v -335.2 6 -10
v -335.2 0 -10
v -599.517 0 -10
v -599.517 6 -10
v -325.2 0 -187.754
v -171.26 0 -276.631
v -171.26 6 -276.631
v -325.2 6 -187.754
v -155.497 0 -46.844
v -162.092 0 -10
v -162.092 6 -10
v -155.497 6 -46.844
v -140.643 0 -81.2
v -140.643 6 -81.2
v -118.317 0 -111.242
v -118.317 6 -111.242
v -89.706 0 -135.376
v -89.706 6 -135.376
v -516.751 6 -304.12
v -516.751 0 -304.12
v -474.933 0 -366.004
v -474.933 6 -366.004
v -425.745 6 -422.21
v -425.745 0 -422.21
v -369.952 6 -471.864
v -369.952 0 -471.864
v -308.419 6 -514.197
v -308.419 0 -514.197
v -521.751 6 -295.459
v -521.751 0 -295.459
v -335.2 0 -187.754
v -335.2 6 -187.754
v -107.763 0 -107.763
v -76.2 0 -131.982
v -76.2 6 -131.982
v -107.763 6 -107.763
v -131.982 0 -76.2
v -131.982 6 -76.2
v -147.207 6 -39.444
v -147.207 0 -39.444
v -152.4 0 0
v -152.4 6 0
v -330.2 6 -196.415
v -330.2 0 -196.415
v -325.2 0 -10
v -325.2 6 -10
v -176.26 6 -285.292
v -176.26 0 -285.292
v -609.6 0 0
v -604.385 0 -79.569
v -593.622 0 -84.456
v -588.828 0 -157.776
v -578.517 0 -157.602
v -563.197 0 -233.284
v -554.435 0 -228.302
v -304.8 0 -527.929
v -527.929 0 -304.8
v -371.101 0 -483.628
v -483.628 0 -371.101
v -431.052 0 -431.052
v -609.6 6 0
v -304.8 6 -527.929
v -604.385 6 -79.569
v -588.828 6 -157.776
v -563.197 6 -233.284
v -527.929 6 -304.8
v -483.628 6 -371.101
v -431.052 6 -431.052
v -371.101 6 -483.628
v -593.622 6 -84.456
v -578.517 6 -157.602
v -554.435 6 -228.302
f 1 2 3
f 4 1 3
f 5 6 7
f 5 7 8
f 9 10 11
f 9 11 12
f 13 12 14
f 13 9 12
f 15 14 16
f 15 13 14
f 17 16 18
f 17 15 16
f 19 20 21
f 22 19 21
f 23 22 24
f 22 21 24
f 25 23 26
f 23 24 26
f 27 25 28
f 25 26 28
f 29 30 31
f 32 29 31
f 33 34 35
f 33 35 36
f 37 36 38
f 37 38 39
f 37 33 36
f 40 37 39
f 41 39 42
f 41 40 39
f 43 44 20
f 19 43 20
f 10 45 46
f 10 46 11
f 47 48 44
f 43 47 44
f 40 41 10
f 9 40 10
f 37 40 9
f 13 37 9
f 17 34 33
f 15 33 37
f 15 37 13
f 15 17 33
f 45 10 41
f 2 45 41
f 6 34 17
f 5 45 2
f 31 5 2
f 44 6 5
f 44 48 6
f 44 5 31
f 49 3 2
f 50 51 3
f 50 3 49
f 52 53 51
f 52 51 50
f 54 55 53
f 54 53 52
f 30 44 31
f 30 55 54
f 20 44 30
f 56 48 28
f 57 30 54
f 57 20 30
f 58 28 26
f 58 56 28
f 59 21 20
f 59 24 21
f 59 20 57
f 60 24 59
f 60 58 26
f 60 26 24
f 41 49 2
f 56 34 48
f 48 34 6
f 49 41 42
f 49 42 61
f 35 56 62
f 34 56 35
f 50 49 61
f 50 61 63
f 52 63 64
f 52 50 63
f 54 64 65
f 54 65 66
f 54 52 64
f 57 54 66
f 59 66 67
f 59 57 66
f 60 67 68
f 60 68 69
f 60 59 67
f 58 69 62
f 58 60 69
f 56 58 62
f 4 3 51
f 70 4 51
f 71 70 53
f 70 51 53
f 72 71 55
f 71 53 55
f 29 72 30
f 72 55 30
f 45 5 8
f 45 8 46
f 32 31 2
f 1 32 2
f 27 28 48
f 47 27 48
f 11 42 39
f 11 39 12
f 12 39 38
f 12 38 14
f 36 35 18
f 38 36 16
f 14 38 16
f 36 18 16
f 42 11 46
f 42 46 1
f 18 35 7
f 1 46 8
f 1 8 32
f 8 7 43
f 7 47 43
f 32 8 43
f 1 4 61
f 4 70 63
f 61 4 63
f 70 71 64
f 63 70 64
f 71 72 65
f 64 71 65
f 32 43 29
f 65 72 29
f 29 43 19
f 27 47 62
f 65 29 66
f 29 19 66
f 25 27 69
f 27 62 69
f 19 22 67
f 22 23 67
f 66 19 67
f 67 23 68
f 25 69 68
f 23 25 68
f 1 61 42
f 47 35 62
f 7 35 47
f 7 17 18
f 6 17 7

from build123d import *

# Parameters (mm, degrees)
BOSS_EXTRUDE3_DEPTH = 6


with BuildPart() as part:
    # Sketch1 → Boss-Extrude3 (new body)
    with BuildSketch(Plane(origin=(0, 0, 0), x_dir=(1, 0, 0), z_dir=(0, 1, 0))):
        with BuildLine():
            ThreePointArc((-76.2, 131.982271537), (-131.982271537, 76.2), (-152.4, 0))
            Line((-152.4, 0), (-609.6, 0))
            ThreePointArc((-609.6, 0), (-527.929086147, 304.8), (-304.8, 527.929086147))
            Line((-304.8, 527.929086147), (-76.2, 131.982271537))
        make_face()
        with BuildLine():
            Line((-335.2, 10), (-599.516605275, 10))
            ThreePointArc((-599.516605275, 10), (-578.516992176, 157.601553812), (-521.750777563, 295.459449184))
            Line((-521.750777563, 295.459449184), (-335.2, 187.75430754))
            Line((-335.2, 187.75430754), (-335.2, 10))
        make_face(mode=Mode.SUBTRACT)
        with BuildLine():
            Line((-89.706166951, 135.375638912), (-171.260254038, 276.631461311))
            Line((-171.260254038, 276.631461311), (-325.2, 187.75430754))
            Line((-325.2, 187.75430754), (-325.2, 10))
            Line((-325.2, 10), (-162.091825827, 10))
            ThreePointArc((-162.091825827, 10), (-140.642525575, 81.2), (-89.706166951, 135.375638912))
        make_face(mode=Mode.SUBTRACT)
        with BuildLine():
            Line((-330.2, 196.414561578), (-516.750777563, 304.119703222))
            ThreePointArc((-516.750777563, 304.119703222), (-425.745445365, 422.209634839), (-308.418556675, 514.196610158))
            Line((-308.418556675, 514.196610158), (-176.260254038, 285.291715349))
            Line((-176.260254038, 285.291715349), (-330.2, 196.414561578))
        make_face(mode=Mode.SUBTRACT)
    extrude(amount=BOSS_EXTRUDE3_DEPTH)


solid = part.part
